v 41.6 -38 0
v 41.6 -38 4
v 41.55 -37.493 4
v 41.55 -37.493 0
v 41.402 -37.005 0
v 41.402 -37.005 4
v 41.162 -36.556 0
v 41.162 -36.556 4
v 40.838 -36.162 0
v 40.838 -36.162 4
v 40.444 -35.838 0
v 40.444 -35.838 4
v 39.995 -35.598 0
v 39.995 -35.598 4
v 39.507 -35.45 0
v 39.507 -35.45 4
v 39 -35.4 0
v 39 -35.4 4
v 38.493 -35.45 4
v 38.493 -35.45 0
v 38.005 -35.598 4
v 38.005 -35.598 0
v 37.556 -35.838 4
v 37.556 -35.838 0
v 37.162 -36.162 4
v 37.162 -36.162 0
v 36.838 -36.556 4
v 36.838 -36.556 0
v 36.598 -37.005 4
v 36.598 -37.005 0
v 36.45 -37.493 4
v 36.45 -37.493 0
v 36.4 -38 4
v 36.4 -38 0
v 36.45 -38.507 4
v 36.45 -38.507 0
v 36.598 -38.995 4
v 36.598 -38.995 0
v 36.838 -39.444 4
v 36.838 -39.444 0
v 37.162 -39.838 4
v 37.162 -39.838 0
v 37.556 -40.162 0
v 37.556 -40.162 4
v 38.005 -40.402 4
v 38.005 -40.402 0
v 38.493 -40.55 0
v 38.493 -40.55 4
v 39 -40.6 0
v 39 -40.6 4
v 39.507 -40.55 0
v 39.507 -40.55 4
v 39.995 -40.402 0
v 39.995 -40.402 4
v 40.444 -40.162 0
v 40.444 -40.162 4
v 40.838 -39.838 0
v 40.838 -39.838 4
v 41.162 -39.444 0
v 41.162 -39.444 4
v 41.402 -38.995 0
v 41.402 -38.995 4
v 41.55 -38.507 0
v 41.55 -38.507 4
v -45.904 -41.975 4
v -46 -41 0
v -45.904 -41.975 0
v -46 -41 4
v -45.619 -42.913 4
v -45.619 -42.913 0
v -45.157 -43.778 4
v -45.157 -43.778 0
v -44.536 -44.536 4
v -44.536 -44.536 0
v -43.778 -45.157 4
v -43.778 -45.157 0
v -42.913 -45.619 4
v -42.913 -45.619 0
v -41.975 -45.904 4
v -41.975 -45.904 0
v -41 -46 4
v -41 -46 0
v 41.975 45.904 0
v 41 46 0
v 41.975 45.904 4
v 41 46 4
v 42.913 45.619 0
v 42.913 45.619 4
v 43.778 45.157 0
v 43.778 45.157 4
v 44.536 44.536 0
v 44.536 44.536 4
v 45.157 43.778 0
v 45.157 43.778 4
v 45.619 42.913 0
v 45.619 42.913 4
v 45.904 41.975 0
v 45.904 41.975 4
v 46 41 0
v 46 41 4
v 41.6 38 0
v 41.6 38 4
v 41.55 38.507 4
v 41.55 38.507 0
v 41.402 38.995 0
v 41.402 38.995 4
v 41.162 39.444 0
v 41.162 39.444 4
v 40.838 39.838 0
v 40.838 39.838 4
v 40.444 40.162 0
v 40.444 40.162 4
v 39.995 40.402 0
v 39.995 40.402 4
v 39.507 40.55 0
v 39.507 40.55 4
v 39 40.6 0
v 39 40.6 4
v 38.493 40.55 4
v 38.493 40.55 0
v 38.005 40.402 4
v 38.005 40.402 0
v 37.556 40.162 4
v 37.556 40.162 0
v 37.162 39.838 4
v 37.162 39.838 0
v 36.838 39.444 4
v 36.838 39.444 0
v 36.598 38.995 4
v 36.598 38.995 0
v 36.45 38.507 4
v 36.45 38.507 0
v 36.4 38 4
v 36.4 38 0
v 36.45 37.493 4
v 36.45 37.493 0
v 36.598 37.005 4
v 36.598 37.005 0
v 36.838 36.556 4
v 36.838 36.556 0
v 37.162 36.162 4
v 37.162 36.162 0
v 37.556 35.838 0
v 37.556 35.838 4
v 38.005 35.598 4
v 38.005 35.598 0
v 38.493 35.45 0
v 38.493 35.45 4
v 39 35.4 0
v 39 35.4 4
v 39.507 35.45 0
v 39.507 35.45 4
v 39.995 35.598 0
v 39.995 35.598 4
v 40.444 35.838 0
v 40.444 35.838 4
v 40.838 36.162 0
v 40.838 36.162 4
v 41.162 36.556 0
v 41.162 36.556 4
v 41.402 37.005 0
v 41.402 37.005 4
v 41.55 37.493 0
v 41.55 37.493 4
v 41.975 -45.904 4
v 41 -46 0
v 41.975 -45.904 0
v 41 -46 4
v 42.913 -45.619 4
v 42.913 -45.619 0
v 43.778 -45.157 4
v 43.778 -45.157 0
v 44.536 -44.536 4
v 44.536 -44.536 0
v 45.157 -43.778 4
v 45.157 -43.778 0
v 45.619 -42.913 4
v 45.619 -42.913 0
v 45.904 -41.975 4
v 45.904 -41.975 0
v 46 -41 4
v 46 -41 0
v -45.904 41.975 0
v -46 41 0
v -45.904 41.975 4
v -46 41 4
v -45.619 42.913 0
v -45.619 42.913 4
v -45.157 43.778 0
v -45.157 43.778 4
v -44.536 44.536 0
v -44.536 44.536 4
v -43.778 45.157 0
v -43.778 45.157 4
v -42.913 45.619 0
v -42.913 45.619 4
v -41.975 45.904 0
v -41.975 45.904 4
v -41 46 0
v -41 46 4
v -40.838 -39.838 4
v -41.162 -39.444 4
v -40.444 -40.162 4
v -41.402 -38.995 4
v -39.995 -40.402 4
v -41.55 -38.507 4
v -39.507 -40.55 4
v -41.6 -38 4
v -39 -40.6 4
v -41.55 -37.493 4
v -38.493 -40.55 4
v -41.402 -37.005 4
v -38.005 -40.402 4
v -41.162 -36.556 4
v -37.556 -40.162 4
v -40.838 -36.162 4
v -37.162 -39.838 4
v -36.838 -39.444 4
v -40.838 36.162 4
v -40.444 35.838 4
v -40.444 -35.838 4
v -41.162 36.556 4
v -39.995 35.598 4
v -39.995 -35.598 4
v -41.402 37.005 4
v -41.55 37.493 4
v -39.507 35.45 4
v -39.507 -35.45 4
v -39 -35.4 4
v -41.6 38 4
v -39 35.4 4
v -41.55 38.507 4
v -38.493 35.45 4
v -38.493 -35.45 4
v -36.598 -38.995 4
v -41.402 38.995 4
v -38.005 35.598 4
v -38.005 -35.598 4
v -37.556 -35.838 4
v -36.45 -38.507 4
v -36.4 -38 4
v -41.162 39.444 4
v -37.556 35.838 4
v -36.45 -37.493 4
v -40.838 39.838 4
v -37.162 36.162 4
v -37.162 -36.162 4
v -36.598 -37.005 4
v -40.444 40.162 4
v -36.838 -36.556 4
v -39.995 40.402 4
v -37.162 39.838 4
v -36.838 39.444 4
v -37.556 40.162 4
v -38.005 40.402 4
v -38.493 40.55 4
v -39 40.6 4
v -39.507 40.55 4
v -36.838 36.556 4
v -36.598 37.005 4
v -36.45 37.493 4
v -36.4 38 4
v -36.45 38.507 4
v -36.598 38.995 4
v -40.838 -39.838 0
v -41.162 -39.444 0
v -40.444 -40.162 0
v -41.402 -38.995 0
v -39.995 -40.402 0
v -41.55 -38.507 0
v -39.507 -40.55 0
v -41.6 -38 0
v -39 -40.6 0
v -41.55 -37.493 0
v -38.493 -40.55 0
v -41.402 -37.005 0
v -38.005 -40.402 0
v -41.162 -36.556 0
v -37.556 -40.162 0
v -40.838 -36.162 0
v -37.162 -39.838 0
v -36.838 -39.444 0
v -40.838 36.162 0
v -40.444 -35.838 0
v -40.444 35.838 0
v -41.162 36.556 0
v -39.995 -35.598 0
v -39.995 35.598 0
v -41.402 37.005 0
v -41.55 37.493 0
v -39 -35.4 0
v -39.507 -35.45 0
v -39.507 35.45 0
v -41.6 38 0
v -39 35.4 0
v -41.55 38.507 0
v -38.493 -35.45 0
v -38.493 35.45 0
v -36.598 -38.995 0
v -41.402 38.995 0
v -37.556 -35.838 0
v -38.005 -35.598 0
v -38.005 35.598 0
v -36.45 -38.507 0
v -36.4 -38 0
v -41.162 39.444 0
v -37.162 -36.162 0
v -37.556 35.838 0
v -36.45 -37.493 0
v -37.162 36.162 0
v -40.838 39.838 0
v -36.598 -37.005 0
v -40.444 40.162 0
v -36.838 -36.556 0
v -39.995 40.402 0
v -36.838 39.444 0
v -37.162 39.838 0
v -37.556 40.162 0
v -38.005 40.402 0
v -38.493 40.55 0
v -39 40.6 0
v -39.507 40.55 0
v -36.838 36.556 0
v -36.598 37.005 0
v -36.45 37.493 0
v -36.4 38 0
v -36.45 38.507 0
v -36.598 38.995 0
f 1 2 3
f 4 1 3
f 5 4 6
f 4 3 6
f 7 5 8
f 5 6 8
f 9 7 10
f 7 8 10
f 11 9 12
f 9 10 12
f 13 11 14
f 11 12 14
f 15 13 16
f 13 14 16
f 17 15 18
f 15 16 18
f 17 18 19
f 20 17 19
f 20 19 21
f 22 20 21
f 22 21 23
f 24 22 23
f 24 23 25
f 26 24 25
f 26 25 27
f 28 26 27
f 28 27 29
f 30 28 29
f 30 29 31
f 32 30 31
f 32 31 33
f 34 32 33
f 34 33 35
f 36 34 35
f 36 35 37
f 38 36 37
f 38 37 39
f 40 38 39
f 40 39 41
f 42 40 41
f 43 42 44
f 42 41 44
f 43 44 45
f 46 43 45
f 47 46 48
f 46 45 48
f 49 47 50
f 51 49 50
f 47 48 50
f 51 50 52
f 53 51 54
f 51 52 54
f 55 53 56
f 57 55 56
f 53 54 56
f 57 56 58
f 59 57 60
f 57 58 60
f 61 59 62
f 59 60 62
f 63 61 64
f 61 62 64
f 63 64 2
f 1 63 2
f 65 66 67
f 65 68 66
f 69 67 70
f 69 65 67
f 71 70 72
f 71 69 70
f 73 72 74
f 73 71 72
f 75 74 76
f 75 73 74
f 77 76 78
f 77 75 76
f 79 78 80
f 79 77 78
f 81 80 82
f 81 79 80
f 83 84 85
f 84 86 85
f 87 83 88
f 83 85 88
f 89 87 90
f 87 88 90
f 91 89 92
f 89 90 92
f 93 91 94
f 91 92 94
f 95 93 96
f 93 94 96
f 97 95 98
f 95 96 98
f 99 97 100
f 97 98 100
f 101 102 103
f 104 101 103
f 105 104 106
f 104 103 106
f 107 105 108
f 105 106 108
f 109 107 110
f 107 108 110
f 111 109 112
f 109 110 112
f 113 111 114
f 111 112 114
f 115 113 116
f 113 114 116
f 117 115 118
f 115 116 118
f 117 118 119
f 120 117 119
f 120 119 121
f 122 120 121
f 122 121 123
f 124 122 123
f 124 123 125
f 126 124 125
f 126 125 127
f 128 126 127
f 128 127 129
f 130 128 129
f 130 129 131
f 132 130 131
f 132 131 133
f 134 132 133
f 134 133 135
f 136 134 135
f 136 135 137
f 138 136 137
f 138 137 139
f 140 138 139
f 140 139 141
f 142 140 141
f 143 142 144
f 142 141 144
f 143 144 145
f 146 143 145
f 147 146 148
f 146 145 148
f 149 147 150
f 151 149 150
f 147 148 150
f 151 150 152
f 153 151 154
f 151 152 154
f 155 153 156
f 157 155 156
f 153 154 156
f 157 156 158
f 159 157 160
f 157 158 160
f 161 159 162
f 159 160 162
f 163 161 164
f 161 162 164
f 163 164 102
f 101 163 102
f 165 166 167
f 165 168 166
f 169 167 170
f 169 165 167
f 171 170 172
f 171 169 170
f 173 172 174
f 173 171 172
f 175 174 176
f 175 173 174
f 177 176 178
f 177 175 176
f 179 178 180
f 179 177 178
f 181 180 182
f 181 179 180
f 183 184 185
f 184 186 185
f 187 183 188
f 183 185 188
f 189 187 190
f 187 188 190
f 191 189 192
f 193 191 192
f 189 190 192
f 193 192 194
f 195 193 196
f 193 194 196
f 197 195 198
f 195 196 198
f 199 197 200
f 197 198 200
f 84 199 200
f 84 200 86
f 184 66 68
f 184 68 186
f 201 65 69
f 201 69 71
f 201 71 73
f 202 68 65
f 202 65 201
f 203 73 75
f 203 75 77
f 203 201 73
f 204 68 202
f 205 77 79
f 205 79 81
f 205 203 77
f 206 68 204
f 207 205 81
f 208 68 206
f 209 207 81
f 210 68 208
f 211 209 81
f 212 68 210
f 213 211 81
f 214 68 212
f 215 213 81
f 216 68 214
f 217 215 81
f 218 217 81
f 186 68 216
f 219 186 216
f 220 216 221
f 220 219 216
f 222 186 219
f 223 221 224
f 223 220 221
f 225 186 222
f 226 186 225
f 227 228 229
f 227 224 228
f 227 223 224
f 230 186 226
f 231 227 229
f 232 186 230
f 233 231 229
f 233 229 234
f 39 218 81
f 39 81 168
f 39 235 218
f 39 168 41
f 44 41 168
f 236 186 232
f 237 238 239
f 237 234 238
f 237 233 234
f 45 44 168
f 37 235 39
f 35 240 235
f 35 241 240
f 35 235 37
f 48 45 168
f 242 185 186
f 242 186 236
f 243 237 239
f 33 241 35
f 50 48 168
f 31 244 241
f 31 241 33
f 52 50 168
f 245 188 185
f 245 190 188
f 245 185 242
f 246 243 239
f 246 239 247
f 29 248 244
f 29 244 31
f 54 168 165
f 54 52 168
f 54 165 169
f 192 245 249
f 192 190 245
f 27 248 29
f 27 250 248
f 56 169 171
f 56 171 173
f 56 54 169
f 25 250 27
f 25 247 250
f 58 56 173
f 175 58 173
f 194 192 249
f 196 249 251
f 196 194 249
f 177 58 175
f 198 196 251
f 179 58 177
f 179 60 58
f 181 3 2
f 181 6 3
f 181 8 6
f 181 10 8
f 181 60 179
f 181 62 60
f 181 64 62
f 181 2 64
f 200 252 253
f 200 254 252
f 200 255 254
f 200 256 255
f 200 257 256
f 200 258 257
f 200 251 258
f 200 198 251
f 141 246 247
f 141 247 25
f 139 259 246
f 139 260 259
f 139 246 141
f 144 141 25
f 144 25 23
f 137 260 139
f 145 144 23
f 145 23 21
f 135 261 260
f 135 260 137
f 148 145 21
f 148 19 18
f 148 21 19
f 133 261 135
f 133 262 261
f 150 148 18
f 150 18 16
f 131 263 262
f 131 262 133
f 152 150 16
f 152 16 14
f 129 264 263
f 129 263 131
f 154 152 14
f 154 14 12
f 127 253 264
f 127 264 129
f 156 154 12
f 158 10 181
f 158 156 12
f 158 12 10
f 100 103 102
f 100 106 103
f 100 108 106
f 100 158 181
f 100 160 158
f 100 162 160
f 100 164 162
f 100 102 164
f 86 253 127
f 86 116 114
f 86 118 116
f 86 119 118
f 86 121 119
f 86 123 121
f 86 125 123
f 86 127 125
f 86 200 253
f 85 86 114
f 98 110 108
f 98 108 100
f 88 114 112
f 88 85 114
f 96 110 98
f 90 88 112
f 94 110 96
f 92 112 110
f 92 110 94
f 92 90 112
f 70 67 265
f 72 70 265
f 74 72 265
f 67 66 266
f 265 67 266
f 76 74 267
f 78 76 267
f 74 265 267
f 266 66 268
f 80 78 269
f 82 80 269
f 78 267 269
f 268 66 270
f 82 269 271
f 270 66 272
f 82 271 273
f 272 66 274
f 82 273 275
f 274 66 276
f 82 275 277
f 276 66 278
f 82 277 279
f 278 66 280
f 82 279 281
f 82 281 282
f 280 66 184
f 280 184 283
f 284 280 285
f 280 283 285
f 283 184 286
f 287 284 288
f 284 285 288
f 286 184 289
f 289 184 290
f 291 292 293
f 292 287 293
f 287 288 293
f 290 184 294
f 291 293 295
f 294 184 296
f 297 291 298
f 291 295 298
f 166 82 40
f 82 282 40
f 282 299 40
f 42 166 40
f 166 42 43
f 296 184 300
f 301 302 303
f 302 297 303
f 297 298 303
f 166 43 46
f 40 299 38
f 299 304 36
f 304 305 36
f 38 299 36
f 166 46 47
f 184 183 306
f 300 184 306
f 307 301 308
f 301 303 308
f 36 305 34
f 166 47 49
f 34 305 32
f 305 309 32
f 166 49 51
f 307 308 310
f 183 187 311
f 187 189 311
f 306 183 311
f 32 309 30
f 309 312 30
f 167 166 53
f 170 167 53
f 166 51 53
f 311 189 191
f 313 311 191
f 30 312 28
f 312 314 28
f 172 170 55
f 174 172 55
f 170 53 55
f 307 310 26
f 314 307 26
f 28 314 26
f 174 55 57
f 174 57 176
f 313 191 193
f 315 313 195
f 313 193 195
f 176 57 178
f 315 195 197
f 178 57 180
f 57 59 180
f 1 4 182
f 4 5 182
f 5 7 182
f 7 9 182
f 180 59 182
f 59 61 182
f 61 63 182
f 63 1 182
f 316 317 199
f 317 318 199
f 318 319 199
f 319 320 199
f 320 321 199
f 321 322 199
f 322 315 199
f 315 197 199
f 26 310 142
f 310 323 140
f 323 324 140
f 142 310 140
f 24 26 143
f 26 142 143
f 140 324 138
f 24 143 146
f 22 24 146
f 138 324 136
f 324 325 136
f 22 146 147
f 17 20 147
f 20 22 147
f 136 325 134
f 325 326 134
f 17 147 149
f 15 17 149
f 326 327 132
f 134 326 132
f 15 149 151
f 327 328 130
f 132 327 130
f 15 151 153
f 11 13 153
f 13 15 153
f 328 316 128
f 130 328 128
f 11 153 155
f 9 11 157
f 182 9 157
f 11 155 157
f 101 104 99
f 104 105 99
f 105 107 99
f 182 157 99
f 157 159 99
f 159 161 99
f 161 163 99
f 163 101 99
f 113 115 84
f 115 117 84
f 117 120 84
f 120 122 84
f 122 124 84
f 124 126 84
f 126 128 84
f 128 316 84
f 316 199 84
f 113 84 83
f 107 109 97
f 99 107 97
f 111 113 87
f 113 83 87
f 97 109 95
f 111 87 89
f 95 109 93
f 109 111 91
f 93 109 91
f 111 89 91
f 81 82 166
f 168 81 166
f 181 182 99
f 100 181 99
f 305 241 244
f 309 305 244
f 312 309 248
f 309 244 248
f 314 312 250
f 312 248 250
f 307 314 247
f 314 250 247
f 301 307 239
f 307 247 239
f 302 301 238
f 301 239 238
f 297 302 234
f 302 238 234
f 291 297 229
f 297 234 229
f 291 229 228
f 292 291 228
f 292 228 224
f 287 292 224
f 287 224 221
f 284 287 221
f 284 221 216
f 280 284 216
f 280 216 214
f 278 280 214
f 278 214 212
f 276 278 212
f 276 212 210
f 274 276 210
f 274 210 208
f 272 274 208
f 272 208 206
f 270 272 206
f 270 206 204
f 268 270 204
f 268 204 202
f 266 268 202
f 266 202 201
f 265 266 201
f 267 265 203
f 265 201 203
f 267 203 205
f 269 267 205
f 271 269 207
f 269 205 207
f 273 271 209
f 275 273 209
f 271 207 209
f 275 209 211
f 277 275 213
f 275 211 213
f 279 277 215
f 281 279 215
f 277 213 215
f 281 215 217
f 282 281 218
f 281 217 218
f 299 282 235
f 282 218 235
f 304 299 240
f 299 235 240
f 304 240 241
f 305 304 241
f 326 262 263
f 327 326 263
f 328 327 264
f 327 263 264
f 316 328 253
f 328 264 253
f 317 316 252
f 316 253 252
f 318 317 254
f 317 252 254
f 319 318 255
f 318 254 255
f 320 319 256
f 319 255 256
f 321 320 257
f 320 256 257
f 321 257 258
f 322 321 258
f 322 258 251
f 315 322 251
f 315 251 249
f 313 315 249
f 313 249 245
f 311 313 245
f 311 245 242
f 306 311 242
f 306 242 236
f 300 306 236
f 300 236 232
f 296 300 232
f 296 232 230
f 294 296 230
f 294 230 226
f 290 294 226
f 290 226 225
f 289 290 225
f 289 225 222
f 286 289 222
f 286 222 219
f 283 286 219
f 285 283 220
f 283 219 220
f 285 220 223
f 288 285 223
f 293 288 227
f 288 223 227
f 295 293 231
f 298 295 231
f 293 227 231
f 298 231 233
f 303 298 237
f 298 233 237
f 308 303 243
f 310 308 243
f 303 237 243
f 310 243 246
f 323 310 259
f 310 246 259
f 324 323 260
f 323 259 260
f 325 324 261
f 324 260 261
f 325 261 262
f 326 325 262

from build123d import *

# Parameters (mm, degrees)
SKETCH036_W     = 92
SKETCH036_H     = 92
PAD022_DEPTH    = 4
SKETCH037_R     = 2.6
POCKET012_DEPTH = 4.001
FILLET001_R     = 5


with BuildPart() as part:
    # Sketch036 → Pad022 (new body)
    with BuildSketch(Plane.XY):
        Rectangle(SKETCH036_W, SKETCH036_H)
    extrude(amount=PAD022_DEPTH)

    # Sketch037 (on Face6 of Pad022) → Pocket012 (cut, through all)
    with BuildSketch(Plane.XY.offset(4)):
        with Locations((-39, 38)):
            Circle(SKETCH037_R)
        with Locations((-39, -38)):
            Circle(SKETCH037_R)
        with Locations((39, -38)):
            Circle(SKETCH037_R)
        with Locations((39, 38)):
            Circle(SKETCH037_R)
    extrude(amount=-POCKET012_DEPTH, mode=Mode.SUBTRACT)

    # Fillet001
    fillet001_edges = [part.edges().sort_by_distance(p)[0] for p in [
        (46, -46, 2),
        (-46, -46, 2),
        (-46, 46, 2),
        (46, 46, 2),
    ]]
    fillet(fillet001_edges, radius=FILLET001_R)


solid = part.part
